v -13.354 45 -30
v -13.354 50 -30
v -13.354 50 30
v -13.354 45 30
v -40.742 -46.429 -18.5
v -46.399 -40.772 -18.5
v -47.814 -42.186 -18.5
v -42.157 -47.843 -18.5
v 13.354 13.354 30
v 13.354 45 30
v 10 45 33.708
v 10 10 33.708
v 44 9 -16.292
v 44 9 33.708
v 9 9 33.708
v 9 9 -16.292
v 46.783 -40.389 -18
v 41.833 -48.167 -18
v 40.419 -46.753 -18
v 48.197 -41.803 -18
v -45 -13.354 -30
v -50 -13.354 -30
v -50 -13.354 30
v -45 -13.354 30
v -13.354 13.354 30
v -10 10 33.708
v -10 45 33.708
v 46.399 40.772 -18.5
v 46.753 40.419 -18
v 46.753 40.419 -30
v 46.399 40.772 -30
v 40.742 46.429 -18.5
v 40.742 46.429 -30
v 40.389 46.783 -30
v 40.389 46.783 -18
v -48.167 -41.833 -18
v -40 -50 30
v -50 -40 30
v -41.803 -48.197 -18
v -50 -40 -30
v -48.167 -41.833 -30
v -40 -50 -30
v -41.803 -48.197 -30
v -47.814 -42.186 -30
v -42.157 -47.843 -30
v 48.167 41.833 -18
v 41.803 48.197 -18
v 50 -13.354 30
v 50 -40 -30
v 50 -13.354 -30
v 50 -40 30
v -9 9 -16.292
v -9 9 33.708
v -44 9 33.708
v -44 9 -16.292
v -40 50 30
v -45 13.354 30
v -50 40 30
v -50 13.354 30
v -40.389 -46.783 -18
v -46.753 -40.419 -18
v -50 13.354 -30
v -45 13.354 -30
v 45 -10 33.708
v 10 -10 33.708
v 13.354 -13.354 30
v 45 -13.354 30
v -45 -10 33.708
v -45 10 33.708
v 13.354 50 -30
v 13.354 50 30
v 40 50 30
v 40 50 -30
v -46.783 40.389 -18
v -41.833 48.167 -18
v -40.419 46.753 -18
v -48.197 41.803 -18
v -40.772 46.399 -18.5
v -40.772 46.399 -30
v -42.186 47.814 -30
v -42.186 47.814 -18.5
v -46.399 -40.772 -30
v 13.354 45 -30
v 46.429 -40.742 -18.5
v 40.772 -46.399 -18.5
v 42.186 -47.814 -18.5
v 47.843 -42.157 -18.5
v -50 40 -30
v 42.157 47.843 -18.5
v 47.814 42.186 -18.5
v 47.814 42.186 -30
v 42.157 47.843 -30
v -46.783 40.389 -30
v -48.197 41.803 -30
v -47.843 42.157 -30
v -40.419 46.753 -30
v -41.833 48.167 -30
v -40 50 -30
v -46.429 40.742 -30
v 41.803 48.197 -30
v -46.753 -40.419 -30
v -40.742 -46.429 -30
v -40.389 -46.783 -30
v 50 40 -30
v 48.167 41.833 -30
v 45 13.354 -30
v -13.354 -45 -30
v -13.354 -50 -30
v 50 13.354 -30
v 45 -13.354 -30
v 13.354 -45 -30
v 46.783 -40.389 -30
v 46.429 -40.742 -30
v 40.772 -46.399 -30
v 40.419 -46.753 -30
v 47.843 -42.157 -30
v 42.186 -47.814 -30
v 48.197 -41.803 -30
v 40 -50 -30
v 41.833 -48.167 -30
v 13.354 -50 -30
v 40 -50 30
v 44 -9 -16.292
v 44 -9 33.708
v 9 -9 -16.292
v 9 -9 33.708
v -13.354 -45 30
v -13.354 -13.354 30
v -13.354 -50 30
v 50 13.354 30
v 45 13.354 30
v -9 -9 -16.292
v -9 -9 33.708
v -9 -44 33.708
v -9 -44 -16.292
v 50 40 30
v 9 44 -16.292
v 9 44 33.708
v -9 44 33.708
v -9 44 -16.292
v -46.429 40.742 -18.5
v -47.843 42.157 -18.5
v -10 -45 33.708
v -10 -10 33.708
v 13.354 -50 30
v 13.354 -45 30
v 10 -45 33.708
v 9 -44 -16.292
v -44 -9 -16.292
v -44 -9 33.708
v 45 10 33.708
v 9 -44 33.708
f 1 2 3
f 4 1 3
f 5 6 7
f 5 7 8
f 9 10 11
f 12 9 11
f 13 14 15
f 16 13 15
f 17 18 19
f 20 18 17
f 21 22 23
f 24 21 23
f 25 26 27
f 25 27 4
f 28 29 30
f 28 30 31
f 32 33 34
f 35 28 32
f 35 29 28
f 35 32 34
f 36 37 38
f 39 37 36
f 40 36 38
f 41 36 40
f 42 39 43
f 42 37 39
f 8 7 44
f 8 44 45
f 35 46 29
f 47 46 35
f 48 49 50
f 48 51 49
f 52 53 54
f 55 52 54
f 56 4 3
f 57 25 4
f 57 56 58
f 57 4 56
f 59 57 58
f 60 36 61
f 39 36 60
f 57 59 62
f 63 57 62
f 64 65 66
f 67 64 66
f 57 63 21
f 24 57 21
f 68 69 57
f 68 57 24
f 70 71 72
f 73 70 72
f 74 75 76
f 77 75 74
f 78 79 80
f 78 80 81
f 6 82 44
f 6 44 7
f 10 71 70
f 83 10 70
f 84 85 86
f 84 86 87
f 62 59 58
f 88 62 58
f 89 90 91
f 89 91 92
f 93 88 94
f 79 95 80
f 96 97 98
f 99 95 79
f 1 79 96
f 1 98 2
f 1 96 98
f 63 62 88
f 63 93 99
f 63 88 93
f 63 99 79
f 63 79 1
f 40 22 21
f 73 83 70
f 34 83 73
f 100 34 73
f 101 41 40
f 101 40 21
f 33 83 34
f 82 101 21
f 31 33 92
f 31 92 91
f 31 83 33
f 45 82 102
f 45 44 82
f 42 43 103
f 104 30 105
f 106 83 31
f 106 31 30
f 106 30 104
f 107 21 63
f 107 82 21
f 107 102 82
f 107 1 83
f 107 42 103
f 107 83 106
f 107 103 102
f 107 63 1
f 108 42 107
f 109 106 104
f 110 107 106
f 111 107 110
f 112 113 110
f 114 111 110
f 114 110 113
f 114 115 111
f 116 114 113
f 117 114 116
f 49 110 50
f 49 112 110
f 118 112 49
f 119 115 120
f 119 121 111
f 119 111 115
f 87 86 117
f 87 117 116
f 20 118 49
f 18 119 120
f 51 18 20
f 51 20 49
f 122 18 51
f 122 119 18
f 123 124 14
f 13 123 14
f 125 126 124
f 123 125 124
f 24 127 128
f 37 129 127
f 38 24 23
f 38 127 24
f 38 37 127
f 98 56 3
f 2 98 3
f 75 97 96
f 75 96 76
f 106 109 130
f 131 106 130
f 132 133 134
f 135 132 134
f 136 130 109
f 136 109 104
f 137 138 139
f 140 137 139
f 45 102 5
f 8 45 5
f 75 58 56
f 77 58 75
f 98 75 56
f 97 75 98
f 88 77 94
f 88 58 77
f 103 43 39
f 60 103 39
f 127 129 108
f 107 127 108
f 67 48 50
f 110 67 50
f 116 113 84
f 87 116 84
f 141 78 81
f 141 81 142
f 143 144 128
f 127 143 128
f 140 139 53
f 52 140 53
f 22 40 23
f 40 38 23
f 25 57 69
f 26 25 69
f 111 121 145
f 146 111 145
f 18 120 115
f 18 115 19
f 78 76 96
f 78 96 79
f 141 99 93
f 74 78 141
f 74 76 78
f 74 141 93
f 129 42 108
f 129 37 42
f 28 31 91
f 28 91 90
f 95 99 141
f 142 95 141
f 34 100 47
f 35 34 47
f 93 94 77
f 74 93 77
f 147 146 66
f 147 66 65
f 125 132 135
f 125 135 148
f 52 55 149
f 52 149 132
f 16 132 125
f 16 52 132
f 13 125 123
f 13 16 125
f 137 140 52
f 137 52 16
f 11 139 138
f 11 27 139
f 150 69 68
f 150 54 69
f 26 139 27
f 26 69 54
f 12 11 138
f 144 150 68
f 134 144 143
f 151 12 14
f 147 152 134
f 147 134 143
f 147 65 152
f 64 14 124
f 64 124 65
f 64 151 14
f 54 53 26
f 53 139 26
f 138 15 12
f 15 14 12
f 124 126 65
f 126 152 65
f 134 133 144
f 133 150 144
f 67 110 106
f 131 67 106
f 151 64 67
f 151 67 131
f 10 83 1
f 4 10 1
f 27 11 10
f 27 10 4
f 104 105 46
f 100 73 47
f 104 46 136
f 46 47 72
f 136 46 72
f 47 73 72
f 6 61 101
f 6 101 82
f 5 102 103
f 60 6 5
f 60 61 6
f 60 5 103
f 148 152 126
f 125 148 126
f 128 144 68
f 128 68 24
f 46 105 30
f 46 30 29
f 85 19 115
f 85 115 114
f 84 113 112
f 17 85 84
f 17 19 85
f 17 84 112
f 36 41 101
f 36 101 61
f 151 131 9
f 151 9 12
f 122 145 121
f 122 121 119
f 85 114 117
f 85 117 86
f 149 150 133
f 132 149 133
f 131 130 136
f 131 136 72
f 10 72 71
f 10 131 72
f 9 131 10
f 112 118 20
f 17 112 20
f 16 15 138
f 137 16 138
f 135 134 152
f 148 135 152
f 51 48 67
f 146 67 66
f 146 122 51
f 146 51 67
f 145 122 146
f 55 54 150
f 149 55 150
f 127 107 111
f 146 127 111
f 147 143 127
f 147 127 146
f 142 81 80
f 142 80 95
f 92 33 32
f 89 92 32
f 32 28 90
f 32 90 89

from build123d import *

# Parameters (mm, degrees)
F1_DEPTH  = 50
F3_DEPTH  = 50
F5_DEPTH  = 5
F7_DEPTH  = 5
F9_DEPTH  = 5
F11_DEPTH = 5
F12_SIZE  = 10
F13_W     = 9
F13_H     = 12
F14_DEPTH = 2
F15_W     = 8
F15_H     = 11.5
F16_DEPTH = 2
F17_W     = 9
F17_H     = 12
F18_DEPTH = 2
F20_W     = 9
F20_H     = 12
F21_DEPTH = 2
F22_W     = 8
F22_H     = 11.5
F23_DEPTH = 2
F24_W     = 9
F24_H     = 12
F25_DEPTH = 2
F26_W     = 8
F26_H     = 11.5
F27_DEPTH = 2
F19_W     = 8
F19_H     = 11.5
F28_DEPTH = 2
F30_DEPTH = 50


with BuildPart() as f1:
    # F0 (on Front) → F1 (new body, symmetric)
    with BuildSketch(Plane.XZ):
        Polygon((-50, -30), (50, -30), (50, 30), (13.3536681533, 30), (10, 33.708491596), (0, 33.708491596), (-10, 33.708491596), (-13.3536681533, 30), (-50, 30), align=None)
    extrude(amount=F1_DEPTH, both=True)

    # F2 (on Right) → F3 (join, symmetric)
    with BuildSketch(Plane.YZ):
        Polygon((10, 33.708491596), (0, 33.708491596), (-10, 33.708491596), (-13.3536681533, 30), (-50, 30), (-50, -30), (0, -30), (50, -30), (50, 30), (13.3536681533, 30), align=None)
    extrude(amount=F3_DEPTH, both=True)

    # F4 (on face) → F5 (cut)
    with BuildSketch(Plane(origin=(-50, 0, 0), x_dir=(0, -1, 0), z_dir=(-1, 0, 0))):
        Polygon((10, 33.708491596), (-10, 33.708491596), (-13.3536681533, 30), (-13.3536681533, -30), (13.3536681533, -30), (13.3536681533, 30), align=None)
    extrude(amount=-F5_DEPTH, mode=Mode.SUBTRACT)

    # F6 (on face) → F7 (cut)
    with BuildSketch(Plane.XZ.offset(50)):
        Polygon((-10, 33.708491596), (-13.3536681533, 30), (-13.3536681533, -30), (13.3536681533, -30), (13.3536681533, 30), (10, 33.708491596), align=None)
    extrude(amount=-F7_DEPTH, mode=Mode.SUBTRACT)

    # F8 (on face) → F9 (cut)
    with BuildSketch(Plane.YZ.offset(50)):
        Polygon((-10, 33.708491596), (-13.3536681533, 30), (-13.3536681533, -30), (13.3536681533, -30), (13.3536681533, 30), (10, 33.708491596), align=None)
    extrude(amount=-F9_DEPTH, mode=Mode.SUBTRACT)

    # F10 (on face) → F11 (cut)
    with BuildSketch(Plane(origin=(0, 50, 0), x_dir=(-1, 0, 0), z_dir=(0, 1, 0))):
        Polygon((-10, 33.708491596), (-13.3536681533, 30), (-13.3536681533, -30), (13.3536681533, -30), (13.3536681533, 30), (10, 33.708491596), align=None)
    extrude(amount=-F11_DEPTH, mode=Mode.SUBTRACT)

    # F12
    f12_edges = [f1.edges().sort_by_distance(p)[0] for p in [
        (50, -50, 0),
        (50, 50, 0),
        (-50, 50, 0),
        (-50, -50, 0),
    ]]
    chamfer(f12_edges, length=F12_SIZE)

    # F13 (on face) → F14 (cut)
    with BuildSketch(Plane(origin=(-45, 45, 0), x_dir=(-0.7071067812, -0.7071067812, 0), z_dir=(-0.7071067812, 0.7071067812, 0))):
        with Locations((0.0210678119, -24)):
            Rectangle(F13_W, F13_H)
    extrude(amount=-F14_DEPTH, mode=Mode.SUBTRACT)

    # F15 (on face) → F16 (join)
    with BuildSketch(Plane(origin=(-43.5857864376, 43.5857864376, 0), x_dir=(-0.7071067812, -0.7071067812, 0), z_dir=(-0.7071067812, 0.7071067812, 0))):
        with Locations((0.0210678119, -24.25)):
            Rectangle(F15_W, F15_H)
    extrude(amount=F16_DEPTH)

    # F17 (on face) → F18 (cut)
    with BuildSketch(Plane(origin=(-45, -45, 0), x_dir=(0.7071067812, -0.7071067812, 0), z_dir=(-0.7071067812, -0.7071067812, 0))):
        with Locations((0.0210678119, -24)):
            Rectangle(F17_W, F17_H)
    extrude(amount=-F18_DEPTH, mode=Mode.SUBTRACT)

    # F20 (on face) → F21 (cut)
    with BuildSketch(Plane(origin=(45, -45, 0), x_dir=(0.7071067812, 0.7071067812, 0), z_dir=(0.7071067812, -0.7071067812, 0))):
        with Locations((0.0210678119, -24)):
            Rectangle(F20_W, F20_H)
    extrude(amount=-F21_DEPTH, mode=Mode.SUBTRACT)

    # F22 (on face) → F23 (join)
    with BuildSketch(Plane(origin=(43.5857864376, -43.5857864376, 0), x_dir=(0.7071067812, 0.7071067812, 0), z_dir=(0.7071067812, -0.7071067812, 0))):
        with Locations((0.0210678119, -24.25)):
            Rectangle(F22_W, F22_H)
    extrude(amount=F23_DEPTH)

    # F24 (on face) → F25 (cut)
    with BuildSketch(Plane(origin=(45, 45, 0), x_dir=(-0.7071067812, 0.7071067812, 0), z_dir=(0.7071067812, 0.7071067812, 0))):
        with Locations((0.0210678119, -24)):
            Rectangle(F24_W, F24_H)
    extrude(amount=-F25_DEPTH, mode=Mode.SUBTRACT)

    # F26 (on face) → F27 (join)
    with BuildSketch(Plane(origin=(43.5857864376, 43.5857864376, 0), x_dir=(-0.7071067812, 0.7071067812, 0), z_dir=(0.7071067812, 0.7071067812, 0))):
        with Locations((0.0210678119, -24.25)):
            Rectangle(F26_W, F26_H)
    extrude(amount=F27_DEPTH)

    # F19 (on face) → F28 (join)
    with BuildSketch(Plane(origin=(-43.5857864376, -43.5857864376, 0), x_dir=(0.7071067812, -0.7071067812, 0), z_dir=(-0.7071067812, -0.7071067812, 0))):
        with Locations((0.0210678119, -24.25)):
            Rectangle(F19_W, F19_H)
    extrude(amount=F28_DEPTH)

    # F29 (on face) → F30 (cut)
    with BuildSketch(Plane.XY.offset(33.708491596)):
        Polygon((-44, 9), (-44, -9), (-9, -9), (-9, -44), (9, -44), (9, -9), (44, -9), (44, 9), (9, 9), (9, 44), (-9, 44), (-9, 9), align=None)
    extrude(amount=-F30_DEPTH, mode=Mode.SUBTRACT)


solid = f1.part
